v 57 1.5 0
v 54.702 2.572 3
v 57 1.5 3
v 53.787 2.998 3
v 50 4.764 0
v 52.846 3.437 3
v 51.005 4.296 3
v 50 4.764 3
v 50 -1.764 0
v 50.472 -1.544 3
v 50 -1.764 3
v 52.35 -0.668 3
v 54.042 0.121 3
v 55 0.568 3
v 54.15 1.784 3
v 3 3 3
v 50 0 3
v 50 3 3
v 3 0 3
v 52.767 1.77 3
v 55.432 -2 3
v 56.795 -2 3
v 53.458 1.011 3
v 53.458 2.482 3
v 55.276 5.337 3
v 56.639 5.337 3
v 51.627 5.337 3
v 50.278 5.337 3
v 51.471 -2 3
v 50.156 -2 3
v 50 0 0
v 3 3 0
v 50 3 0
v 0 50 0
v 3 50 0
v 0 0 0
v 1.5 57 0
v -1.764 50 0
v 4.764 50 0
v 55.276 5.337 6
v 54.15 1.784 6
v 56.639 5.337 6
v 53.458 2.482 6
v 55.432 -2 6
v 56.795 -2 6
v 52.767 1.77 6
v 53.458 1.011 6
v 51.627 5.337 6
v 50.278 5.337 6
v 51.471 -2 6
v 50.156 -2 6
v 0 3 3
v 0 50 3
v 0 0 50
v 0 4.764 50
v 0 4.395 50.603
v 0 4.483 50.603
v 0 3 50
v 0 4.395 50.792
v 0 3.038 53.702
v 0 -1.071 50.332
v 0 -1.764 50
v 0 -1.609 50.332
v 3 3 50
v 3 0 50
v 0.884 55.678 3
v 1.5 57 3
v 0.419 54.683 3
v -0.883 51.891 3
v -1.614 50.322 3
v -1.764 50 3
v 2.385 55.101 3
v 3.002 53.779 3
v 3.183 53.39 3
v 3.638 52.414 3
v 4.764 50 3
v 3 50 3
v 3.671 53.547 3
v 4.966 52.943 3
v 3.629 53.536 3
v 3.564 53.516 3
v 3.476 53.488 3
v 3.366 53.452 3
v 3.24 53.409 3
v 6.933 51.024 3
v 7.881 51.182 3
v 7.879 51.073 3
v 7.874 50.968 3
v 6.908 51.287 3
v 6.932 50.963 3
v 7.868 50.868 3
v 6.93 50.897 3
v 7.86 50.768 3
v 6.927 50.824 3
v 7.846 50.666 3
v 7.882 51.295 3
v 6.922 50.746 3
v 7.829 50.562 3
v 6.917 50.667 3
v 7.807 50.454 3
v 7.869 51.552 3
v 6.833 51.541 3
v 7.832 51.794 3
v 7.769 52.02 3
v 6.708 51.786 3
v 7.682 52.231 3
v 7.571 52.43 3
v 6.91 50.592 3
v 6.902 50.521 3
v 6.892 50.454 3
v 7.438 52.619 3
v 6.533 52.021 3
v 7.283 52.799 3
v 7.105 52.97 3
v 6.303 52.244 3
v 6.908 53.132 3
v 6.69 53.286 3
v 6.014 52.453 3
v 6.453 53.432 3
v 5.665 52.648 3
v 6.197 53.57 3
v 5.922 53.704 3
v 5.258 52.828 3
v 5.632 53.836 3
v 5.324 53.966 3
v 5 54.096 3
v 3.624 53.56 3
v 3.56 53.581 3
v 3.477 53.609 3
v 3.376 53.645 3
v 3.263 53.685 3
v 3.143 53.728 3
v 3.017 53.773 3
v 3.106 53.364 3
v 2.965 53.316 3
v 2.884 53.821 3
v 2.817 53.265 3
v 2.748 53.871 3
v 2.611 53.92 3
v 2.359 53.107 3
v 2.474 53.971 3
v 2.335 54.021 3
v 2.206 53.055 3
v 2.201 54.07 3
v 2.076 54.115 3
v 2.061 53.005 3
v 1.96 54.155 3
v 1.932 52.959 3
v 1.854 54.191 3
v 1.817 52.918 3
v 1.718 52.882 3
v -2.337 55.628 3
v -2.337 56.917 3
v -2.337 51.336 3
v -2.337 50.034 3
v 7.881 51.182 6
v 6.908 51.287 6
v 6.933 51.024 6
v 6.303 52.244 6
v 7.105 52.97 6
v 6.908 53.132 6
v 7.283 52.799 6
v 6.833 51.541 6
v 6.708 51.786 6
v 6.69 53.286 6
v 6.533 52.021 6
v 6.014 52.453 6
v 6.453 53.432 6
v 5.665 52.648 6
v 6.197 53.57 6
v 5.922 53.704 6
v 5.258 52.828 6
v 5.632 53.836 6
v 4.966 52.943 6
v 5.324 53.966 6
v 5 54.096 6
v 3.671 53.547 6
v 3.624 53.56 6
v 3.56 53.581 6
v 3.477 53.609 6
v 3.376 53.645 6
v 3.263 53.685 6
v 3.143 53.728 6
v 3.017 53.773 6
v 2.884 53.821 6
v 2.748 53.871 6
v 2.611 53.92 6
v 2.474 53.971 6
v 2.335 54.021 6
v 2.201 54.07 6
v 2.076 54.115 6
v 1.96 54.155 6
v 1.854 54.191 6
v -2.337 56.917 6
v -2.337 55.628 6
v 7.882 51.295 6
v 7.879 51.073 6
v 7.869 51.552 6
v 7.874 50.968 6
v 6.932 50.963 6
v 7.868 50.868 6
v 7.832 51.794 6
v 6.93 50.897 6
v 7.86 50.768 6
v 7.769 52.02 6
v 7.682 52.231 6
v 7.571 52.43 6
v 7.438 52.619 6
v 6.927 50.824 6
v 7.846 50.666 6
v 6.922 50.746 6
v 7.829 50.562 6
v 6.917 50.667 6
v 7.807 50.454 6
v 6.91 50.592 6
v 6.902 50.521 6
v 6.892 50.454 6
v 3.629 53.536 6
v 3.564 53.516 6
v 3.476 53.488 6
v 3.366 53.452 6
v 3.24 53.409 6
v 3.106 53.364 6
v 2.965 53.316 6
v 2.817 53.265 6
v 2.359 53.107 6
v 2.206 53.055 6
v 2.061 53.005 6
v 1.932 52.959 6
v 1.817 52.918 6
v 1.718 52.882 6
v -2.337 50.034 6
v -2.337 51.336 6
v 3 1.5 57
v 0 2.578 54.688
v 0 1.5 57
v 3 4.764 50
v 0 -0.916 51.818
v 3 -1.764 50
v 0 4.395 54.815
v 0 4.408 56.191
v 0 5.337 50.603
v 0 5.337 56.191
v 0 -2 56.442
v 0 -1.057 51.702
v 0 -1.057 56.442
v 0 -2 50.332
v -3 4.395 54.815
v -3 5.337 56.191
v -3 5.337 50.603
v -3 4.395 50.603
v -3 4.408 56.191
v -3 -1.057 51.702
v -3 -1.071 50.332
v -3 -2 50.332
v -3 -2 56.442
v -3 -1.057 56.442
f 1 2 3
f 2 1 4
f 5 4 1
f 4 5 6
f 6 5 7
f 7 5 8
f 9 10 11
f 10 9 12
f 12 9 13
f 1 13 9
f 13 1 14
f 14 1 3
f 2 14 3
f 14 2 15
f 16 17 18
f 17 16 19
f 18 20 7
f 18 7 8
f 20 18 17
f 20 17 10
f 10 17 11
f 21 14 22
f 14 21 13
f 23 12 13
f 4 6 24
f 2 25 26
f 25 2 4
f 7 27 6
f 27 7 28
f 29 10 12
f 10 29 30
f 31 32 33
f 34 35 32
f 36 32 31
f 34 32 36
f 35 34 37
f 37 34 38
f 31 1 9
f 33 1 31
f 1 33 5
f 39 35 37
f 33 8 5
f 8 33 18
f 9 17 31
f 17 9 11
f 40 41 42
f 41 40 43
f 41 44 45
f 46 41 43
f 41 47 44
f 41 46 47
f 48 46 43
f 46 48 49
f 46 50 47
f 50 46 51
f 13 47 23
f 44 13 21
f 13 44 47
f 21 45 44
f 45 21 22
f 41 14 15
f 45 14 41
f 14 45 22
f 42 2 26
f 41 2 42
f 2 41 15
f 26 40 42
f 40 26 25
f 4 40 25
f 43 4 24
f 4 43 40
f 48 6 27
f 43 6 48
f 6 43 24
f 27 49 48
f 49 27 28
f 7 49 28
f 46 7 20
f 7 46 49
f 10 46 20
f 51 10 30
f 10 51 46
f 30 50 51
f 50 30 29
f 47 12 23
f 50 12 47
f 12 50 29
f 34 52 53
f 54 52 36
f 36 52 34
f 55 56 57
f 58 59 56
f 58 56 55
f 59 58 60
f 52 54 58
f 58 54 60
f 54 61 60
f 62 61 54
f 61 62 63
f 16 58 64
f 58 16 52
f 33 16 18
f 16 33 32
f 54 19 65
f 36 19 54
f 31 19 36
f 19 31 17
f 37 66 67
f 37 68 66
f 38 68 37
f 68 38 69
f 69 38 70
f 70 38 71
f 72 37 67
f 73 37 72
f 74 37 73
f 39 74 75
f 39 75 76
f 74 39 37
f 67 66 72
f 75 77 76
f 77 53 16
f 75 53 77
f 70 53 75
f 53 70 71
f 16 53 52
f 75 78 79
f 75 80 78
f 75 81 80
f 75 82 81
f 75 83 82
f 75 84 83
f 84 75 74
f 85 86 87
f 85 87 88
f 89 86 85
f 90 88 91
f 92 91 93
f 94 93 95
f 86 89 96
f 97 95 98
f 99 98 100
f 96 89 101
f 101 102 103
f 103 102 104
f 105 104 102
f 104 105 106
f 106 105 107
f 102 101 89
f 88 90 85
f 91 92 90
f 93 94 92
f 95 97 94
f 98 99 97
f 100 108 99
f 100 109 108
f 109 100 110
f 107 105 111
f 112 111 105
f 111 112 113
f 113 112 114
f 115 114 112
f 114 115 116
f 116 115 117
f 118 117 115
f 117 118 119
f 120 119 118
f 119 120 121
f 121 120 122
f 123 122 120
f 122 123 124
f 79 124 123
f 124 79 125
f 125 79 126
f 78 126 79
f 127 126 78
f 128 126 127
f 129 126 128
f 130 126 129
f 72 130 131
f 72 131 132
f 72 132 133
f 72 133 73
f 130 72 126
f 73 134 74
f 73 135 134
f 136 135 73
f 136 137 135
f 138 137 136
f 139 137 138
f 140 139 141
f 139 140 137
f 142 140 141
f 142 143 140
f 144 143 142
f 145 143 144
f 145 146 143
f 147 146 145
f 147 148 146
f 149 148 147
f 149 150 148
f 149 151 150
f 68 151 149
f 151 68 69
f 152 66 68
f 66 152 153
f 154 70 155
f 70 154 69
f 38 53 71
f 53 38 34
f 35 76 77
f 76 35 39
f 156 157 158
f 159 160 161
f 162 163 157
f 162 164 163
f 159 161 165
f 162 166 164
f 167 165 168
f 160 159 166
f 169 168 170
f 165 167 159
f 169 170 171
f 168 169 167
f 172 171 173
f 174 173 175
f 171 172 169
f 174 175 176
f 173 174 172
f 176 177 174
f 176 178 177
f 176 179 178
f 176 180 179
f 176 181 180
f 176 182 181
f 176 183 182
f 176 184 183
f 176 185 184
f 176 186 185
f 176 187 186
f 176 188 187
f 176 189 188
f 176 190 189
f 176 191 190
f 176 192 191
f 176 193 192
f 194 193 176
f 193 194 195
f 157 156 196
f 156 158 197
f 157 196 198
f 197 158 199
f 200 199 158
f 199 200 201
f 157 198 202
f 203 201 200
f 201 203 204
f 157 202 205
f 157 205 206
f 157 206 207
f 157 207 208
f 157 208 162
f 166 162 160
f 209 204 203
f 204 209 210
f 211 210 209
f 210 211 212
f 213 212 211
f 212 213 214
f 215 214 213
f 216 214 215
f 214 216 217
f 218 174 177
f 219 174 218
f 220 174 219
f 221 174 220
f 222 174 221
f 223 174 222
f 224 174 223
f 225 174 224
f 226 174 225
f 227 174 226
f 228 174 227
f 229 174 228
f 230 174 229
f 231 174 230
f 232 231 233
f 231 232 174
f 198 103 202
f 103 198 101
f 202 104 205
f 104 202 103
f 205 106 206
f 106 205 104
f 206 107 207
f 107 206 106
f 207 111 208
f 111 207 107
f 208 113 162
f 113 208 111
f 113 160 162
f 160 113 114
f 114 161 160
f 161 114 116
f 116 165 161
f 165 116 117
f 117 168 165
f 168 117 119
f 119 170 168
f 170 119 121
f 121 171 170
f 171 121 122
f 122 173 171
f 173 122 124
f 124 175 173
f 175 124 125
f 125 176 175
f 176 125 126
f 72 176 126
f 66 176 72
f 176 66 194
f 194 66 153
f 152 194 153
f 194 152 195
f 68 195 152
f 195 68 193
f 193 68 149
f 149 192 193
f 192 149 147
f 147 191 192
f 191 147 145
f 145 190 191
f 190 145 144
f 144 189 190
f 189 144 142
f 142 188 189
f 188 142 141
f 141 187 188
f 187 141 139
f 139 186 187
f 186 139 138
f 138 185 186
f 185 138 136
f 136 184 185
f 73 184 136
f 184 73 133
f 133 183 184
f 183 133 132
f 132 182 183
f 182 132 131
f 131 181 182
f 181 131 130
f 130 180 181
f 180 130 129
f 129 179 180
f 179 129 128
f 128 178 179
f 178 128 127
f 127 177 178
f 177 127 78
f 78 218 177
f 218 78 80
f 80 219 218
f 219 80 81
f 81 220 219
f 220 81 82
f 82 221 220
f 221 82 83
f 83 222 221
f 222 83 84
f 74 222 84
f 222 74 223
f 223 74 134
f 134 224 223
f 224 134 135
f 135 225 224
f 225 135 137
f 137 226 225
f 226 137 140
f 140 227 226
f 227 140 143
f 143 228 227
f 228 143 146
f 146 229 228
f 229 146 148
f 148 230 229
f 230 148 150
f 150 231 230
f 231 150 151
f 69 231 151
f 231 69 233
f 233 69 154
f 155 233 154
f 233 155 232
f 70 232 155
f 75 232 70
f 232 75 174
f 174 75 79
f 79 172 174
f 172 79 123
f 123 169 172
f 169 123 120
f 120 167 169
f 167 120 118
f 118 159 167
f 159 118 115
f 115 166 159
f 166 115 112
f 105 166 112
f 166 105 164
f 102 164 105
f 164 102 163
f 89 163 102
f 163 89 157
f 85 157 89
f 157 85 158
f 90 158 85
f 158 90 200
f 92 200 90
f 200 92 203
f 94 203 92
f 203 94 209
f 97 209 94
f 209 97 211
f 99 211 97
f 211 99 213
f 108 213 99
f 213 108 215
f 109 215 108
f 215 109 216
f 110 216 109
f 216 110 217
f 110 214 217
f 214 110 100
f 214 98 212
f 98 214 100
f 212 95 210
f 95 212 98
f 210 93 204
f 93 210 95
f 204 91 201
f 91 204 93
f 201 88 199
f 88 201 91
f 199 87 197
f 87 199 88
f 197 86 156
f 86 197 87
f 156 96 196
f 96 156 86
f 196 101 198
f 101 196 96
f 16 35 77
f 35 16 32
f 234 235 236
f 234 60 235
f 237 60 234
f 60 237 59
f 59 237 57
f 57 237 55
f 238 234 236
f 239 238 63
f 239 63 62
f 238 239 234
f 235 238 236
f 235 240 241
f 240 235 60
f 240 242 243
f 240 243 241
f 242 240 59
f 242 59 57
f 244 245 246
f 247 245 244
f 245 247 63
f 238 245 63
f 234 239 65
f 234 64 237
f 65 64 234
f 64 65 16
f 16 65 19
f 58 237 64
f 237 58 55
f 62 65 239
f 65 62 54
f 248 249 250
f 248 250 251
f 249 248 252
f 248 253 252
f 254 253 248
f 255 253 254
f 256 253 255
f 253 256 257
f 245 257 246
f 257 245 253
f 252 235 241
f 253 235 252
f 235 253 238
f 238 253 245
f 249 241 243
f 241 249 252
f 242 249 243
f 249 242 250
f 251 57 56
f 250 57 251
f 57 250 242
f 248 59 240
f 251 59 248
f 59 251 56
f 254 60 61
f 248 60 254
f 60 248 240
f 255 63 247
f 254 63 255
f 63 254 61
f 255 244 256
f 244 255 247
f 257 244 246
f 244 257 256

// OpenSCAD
module pil(char){
    cube([50,3,3]);
    translate([50,-2,0]){
        translate([0,0,3])
            linear_extrude(height= 3){
            text(char);
            }
        difference(){
            cube([7,7,3]);
            translate([7,3.5,-1]){
                rotate([0,0,65])
                cube([10,10,5]);
                rotate([0,0,-65-90])
                cube([10,10,5]);

                }
    
            }
        }
    }


pil("x");

translate([3,0,0])
    rotate([0,0,90]) 
        pil("y");

translate([3,0,0])
    rotate([0,-90,0]) 
        pil("z");
